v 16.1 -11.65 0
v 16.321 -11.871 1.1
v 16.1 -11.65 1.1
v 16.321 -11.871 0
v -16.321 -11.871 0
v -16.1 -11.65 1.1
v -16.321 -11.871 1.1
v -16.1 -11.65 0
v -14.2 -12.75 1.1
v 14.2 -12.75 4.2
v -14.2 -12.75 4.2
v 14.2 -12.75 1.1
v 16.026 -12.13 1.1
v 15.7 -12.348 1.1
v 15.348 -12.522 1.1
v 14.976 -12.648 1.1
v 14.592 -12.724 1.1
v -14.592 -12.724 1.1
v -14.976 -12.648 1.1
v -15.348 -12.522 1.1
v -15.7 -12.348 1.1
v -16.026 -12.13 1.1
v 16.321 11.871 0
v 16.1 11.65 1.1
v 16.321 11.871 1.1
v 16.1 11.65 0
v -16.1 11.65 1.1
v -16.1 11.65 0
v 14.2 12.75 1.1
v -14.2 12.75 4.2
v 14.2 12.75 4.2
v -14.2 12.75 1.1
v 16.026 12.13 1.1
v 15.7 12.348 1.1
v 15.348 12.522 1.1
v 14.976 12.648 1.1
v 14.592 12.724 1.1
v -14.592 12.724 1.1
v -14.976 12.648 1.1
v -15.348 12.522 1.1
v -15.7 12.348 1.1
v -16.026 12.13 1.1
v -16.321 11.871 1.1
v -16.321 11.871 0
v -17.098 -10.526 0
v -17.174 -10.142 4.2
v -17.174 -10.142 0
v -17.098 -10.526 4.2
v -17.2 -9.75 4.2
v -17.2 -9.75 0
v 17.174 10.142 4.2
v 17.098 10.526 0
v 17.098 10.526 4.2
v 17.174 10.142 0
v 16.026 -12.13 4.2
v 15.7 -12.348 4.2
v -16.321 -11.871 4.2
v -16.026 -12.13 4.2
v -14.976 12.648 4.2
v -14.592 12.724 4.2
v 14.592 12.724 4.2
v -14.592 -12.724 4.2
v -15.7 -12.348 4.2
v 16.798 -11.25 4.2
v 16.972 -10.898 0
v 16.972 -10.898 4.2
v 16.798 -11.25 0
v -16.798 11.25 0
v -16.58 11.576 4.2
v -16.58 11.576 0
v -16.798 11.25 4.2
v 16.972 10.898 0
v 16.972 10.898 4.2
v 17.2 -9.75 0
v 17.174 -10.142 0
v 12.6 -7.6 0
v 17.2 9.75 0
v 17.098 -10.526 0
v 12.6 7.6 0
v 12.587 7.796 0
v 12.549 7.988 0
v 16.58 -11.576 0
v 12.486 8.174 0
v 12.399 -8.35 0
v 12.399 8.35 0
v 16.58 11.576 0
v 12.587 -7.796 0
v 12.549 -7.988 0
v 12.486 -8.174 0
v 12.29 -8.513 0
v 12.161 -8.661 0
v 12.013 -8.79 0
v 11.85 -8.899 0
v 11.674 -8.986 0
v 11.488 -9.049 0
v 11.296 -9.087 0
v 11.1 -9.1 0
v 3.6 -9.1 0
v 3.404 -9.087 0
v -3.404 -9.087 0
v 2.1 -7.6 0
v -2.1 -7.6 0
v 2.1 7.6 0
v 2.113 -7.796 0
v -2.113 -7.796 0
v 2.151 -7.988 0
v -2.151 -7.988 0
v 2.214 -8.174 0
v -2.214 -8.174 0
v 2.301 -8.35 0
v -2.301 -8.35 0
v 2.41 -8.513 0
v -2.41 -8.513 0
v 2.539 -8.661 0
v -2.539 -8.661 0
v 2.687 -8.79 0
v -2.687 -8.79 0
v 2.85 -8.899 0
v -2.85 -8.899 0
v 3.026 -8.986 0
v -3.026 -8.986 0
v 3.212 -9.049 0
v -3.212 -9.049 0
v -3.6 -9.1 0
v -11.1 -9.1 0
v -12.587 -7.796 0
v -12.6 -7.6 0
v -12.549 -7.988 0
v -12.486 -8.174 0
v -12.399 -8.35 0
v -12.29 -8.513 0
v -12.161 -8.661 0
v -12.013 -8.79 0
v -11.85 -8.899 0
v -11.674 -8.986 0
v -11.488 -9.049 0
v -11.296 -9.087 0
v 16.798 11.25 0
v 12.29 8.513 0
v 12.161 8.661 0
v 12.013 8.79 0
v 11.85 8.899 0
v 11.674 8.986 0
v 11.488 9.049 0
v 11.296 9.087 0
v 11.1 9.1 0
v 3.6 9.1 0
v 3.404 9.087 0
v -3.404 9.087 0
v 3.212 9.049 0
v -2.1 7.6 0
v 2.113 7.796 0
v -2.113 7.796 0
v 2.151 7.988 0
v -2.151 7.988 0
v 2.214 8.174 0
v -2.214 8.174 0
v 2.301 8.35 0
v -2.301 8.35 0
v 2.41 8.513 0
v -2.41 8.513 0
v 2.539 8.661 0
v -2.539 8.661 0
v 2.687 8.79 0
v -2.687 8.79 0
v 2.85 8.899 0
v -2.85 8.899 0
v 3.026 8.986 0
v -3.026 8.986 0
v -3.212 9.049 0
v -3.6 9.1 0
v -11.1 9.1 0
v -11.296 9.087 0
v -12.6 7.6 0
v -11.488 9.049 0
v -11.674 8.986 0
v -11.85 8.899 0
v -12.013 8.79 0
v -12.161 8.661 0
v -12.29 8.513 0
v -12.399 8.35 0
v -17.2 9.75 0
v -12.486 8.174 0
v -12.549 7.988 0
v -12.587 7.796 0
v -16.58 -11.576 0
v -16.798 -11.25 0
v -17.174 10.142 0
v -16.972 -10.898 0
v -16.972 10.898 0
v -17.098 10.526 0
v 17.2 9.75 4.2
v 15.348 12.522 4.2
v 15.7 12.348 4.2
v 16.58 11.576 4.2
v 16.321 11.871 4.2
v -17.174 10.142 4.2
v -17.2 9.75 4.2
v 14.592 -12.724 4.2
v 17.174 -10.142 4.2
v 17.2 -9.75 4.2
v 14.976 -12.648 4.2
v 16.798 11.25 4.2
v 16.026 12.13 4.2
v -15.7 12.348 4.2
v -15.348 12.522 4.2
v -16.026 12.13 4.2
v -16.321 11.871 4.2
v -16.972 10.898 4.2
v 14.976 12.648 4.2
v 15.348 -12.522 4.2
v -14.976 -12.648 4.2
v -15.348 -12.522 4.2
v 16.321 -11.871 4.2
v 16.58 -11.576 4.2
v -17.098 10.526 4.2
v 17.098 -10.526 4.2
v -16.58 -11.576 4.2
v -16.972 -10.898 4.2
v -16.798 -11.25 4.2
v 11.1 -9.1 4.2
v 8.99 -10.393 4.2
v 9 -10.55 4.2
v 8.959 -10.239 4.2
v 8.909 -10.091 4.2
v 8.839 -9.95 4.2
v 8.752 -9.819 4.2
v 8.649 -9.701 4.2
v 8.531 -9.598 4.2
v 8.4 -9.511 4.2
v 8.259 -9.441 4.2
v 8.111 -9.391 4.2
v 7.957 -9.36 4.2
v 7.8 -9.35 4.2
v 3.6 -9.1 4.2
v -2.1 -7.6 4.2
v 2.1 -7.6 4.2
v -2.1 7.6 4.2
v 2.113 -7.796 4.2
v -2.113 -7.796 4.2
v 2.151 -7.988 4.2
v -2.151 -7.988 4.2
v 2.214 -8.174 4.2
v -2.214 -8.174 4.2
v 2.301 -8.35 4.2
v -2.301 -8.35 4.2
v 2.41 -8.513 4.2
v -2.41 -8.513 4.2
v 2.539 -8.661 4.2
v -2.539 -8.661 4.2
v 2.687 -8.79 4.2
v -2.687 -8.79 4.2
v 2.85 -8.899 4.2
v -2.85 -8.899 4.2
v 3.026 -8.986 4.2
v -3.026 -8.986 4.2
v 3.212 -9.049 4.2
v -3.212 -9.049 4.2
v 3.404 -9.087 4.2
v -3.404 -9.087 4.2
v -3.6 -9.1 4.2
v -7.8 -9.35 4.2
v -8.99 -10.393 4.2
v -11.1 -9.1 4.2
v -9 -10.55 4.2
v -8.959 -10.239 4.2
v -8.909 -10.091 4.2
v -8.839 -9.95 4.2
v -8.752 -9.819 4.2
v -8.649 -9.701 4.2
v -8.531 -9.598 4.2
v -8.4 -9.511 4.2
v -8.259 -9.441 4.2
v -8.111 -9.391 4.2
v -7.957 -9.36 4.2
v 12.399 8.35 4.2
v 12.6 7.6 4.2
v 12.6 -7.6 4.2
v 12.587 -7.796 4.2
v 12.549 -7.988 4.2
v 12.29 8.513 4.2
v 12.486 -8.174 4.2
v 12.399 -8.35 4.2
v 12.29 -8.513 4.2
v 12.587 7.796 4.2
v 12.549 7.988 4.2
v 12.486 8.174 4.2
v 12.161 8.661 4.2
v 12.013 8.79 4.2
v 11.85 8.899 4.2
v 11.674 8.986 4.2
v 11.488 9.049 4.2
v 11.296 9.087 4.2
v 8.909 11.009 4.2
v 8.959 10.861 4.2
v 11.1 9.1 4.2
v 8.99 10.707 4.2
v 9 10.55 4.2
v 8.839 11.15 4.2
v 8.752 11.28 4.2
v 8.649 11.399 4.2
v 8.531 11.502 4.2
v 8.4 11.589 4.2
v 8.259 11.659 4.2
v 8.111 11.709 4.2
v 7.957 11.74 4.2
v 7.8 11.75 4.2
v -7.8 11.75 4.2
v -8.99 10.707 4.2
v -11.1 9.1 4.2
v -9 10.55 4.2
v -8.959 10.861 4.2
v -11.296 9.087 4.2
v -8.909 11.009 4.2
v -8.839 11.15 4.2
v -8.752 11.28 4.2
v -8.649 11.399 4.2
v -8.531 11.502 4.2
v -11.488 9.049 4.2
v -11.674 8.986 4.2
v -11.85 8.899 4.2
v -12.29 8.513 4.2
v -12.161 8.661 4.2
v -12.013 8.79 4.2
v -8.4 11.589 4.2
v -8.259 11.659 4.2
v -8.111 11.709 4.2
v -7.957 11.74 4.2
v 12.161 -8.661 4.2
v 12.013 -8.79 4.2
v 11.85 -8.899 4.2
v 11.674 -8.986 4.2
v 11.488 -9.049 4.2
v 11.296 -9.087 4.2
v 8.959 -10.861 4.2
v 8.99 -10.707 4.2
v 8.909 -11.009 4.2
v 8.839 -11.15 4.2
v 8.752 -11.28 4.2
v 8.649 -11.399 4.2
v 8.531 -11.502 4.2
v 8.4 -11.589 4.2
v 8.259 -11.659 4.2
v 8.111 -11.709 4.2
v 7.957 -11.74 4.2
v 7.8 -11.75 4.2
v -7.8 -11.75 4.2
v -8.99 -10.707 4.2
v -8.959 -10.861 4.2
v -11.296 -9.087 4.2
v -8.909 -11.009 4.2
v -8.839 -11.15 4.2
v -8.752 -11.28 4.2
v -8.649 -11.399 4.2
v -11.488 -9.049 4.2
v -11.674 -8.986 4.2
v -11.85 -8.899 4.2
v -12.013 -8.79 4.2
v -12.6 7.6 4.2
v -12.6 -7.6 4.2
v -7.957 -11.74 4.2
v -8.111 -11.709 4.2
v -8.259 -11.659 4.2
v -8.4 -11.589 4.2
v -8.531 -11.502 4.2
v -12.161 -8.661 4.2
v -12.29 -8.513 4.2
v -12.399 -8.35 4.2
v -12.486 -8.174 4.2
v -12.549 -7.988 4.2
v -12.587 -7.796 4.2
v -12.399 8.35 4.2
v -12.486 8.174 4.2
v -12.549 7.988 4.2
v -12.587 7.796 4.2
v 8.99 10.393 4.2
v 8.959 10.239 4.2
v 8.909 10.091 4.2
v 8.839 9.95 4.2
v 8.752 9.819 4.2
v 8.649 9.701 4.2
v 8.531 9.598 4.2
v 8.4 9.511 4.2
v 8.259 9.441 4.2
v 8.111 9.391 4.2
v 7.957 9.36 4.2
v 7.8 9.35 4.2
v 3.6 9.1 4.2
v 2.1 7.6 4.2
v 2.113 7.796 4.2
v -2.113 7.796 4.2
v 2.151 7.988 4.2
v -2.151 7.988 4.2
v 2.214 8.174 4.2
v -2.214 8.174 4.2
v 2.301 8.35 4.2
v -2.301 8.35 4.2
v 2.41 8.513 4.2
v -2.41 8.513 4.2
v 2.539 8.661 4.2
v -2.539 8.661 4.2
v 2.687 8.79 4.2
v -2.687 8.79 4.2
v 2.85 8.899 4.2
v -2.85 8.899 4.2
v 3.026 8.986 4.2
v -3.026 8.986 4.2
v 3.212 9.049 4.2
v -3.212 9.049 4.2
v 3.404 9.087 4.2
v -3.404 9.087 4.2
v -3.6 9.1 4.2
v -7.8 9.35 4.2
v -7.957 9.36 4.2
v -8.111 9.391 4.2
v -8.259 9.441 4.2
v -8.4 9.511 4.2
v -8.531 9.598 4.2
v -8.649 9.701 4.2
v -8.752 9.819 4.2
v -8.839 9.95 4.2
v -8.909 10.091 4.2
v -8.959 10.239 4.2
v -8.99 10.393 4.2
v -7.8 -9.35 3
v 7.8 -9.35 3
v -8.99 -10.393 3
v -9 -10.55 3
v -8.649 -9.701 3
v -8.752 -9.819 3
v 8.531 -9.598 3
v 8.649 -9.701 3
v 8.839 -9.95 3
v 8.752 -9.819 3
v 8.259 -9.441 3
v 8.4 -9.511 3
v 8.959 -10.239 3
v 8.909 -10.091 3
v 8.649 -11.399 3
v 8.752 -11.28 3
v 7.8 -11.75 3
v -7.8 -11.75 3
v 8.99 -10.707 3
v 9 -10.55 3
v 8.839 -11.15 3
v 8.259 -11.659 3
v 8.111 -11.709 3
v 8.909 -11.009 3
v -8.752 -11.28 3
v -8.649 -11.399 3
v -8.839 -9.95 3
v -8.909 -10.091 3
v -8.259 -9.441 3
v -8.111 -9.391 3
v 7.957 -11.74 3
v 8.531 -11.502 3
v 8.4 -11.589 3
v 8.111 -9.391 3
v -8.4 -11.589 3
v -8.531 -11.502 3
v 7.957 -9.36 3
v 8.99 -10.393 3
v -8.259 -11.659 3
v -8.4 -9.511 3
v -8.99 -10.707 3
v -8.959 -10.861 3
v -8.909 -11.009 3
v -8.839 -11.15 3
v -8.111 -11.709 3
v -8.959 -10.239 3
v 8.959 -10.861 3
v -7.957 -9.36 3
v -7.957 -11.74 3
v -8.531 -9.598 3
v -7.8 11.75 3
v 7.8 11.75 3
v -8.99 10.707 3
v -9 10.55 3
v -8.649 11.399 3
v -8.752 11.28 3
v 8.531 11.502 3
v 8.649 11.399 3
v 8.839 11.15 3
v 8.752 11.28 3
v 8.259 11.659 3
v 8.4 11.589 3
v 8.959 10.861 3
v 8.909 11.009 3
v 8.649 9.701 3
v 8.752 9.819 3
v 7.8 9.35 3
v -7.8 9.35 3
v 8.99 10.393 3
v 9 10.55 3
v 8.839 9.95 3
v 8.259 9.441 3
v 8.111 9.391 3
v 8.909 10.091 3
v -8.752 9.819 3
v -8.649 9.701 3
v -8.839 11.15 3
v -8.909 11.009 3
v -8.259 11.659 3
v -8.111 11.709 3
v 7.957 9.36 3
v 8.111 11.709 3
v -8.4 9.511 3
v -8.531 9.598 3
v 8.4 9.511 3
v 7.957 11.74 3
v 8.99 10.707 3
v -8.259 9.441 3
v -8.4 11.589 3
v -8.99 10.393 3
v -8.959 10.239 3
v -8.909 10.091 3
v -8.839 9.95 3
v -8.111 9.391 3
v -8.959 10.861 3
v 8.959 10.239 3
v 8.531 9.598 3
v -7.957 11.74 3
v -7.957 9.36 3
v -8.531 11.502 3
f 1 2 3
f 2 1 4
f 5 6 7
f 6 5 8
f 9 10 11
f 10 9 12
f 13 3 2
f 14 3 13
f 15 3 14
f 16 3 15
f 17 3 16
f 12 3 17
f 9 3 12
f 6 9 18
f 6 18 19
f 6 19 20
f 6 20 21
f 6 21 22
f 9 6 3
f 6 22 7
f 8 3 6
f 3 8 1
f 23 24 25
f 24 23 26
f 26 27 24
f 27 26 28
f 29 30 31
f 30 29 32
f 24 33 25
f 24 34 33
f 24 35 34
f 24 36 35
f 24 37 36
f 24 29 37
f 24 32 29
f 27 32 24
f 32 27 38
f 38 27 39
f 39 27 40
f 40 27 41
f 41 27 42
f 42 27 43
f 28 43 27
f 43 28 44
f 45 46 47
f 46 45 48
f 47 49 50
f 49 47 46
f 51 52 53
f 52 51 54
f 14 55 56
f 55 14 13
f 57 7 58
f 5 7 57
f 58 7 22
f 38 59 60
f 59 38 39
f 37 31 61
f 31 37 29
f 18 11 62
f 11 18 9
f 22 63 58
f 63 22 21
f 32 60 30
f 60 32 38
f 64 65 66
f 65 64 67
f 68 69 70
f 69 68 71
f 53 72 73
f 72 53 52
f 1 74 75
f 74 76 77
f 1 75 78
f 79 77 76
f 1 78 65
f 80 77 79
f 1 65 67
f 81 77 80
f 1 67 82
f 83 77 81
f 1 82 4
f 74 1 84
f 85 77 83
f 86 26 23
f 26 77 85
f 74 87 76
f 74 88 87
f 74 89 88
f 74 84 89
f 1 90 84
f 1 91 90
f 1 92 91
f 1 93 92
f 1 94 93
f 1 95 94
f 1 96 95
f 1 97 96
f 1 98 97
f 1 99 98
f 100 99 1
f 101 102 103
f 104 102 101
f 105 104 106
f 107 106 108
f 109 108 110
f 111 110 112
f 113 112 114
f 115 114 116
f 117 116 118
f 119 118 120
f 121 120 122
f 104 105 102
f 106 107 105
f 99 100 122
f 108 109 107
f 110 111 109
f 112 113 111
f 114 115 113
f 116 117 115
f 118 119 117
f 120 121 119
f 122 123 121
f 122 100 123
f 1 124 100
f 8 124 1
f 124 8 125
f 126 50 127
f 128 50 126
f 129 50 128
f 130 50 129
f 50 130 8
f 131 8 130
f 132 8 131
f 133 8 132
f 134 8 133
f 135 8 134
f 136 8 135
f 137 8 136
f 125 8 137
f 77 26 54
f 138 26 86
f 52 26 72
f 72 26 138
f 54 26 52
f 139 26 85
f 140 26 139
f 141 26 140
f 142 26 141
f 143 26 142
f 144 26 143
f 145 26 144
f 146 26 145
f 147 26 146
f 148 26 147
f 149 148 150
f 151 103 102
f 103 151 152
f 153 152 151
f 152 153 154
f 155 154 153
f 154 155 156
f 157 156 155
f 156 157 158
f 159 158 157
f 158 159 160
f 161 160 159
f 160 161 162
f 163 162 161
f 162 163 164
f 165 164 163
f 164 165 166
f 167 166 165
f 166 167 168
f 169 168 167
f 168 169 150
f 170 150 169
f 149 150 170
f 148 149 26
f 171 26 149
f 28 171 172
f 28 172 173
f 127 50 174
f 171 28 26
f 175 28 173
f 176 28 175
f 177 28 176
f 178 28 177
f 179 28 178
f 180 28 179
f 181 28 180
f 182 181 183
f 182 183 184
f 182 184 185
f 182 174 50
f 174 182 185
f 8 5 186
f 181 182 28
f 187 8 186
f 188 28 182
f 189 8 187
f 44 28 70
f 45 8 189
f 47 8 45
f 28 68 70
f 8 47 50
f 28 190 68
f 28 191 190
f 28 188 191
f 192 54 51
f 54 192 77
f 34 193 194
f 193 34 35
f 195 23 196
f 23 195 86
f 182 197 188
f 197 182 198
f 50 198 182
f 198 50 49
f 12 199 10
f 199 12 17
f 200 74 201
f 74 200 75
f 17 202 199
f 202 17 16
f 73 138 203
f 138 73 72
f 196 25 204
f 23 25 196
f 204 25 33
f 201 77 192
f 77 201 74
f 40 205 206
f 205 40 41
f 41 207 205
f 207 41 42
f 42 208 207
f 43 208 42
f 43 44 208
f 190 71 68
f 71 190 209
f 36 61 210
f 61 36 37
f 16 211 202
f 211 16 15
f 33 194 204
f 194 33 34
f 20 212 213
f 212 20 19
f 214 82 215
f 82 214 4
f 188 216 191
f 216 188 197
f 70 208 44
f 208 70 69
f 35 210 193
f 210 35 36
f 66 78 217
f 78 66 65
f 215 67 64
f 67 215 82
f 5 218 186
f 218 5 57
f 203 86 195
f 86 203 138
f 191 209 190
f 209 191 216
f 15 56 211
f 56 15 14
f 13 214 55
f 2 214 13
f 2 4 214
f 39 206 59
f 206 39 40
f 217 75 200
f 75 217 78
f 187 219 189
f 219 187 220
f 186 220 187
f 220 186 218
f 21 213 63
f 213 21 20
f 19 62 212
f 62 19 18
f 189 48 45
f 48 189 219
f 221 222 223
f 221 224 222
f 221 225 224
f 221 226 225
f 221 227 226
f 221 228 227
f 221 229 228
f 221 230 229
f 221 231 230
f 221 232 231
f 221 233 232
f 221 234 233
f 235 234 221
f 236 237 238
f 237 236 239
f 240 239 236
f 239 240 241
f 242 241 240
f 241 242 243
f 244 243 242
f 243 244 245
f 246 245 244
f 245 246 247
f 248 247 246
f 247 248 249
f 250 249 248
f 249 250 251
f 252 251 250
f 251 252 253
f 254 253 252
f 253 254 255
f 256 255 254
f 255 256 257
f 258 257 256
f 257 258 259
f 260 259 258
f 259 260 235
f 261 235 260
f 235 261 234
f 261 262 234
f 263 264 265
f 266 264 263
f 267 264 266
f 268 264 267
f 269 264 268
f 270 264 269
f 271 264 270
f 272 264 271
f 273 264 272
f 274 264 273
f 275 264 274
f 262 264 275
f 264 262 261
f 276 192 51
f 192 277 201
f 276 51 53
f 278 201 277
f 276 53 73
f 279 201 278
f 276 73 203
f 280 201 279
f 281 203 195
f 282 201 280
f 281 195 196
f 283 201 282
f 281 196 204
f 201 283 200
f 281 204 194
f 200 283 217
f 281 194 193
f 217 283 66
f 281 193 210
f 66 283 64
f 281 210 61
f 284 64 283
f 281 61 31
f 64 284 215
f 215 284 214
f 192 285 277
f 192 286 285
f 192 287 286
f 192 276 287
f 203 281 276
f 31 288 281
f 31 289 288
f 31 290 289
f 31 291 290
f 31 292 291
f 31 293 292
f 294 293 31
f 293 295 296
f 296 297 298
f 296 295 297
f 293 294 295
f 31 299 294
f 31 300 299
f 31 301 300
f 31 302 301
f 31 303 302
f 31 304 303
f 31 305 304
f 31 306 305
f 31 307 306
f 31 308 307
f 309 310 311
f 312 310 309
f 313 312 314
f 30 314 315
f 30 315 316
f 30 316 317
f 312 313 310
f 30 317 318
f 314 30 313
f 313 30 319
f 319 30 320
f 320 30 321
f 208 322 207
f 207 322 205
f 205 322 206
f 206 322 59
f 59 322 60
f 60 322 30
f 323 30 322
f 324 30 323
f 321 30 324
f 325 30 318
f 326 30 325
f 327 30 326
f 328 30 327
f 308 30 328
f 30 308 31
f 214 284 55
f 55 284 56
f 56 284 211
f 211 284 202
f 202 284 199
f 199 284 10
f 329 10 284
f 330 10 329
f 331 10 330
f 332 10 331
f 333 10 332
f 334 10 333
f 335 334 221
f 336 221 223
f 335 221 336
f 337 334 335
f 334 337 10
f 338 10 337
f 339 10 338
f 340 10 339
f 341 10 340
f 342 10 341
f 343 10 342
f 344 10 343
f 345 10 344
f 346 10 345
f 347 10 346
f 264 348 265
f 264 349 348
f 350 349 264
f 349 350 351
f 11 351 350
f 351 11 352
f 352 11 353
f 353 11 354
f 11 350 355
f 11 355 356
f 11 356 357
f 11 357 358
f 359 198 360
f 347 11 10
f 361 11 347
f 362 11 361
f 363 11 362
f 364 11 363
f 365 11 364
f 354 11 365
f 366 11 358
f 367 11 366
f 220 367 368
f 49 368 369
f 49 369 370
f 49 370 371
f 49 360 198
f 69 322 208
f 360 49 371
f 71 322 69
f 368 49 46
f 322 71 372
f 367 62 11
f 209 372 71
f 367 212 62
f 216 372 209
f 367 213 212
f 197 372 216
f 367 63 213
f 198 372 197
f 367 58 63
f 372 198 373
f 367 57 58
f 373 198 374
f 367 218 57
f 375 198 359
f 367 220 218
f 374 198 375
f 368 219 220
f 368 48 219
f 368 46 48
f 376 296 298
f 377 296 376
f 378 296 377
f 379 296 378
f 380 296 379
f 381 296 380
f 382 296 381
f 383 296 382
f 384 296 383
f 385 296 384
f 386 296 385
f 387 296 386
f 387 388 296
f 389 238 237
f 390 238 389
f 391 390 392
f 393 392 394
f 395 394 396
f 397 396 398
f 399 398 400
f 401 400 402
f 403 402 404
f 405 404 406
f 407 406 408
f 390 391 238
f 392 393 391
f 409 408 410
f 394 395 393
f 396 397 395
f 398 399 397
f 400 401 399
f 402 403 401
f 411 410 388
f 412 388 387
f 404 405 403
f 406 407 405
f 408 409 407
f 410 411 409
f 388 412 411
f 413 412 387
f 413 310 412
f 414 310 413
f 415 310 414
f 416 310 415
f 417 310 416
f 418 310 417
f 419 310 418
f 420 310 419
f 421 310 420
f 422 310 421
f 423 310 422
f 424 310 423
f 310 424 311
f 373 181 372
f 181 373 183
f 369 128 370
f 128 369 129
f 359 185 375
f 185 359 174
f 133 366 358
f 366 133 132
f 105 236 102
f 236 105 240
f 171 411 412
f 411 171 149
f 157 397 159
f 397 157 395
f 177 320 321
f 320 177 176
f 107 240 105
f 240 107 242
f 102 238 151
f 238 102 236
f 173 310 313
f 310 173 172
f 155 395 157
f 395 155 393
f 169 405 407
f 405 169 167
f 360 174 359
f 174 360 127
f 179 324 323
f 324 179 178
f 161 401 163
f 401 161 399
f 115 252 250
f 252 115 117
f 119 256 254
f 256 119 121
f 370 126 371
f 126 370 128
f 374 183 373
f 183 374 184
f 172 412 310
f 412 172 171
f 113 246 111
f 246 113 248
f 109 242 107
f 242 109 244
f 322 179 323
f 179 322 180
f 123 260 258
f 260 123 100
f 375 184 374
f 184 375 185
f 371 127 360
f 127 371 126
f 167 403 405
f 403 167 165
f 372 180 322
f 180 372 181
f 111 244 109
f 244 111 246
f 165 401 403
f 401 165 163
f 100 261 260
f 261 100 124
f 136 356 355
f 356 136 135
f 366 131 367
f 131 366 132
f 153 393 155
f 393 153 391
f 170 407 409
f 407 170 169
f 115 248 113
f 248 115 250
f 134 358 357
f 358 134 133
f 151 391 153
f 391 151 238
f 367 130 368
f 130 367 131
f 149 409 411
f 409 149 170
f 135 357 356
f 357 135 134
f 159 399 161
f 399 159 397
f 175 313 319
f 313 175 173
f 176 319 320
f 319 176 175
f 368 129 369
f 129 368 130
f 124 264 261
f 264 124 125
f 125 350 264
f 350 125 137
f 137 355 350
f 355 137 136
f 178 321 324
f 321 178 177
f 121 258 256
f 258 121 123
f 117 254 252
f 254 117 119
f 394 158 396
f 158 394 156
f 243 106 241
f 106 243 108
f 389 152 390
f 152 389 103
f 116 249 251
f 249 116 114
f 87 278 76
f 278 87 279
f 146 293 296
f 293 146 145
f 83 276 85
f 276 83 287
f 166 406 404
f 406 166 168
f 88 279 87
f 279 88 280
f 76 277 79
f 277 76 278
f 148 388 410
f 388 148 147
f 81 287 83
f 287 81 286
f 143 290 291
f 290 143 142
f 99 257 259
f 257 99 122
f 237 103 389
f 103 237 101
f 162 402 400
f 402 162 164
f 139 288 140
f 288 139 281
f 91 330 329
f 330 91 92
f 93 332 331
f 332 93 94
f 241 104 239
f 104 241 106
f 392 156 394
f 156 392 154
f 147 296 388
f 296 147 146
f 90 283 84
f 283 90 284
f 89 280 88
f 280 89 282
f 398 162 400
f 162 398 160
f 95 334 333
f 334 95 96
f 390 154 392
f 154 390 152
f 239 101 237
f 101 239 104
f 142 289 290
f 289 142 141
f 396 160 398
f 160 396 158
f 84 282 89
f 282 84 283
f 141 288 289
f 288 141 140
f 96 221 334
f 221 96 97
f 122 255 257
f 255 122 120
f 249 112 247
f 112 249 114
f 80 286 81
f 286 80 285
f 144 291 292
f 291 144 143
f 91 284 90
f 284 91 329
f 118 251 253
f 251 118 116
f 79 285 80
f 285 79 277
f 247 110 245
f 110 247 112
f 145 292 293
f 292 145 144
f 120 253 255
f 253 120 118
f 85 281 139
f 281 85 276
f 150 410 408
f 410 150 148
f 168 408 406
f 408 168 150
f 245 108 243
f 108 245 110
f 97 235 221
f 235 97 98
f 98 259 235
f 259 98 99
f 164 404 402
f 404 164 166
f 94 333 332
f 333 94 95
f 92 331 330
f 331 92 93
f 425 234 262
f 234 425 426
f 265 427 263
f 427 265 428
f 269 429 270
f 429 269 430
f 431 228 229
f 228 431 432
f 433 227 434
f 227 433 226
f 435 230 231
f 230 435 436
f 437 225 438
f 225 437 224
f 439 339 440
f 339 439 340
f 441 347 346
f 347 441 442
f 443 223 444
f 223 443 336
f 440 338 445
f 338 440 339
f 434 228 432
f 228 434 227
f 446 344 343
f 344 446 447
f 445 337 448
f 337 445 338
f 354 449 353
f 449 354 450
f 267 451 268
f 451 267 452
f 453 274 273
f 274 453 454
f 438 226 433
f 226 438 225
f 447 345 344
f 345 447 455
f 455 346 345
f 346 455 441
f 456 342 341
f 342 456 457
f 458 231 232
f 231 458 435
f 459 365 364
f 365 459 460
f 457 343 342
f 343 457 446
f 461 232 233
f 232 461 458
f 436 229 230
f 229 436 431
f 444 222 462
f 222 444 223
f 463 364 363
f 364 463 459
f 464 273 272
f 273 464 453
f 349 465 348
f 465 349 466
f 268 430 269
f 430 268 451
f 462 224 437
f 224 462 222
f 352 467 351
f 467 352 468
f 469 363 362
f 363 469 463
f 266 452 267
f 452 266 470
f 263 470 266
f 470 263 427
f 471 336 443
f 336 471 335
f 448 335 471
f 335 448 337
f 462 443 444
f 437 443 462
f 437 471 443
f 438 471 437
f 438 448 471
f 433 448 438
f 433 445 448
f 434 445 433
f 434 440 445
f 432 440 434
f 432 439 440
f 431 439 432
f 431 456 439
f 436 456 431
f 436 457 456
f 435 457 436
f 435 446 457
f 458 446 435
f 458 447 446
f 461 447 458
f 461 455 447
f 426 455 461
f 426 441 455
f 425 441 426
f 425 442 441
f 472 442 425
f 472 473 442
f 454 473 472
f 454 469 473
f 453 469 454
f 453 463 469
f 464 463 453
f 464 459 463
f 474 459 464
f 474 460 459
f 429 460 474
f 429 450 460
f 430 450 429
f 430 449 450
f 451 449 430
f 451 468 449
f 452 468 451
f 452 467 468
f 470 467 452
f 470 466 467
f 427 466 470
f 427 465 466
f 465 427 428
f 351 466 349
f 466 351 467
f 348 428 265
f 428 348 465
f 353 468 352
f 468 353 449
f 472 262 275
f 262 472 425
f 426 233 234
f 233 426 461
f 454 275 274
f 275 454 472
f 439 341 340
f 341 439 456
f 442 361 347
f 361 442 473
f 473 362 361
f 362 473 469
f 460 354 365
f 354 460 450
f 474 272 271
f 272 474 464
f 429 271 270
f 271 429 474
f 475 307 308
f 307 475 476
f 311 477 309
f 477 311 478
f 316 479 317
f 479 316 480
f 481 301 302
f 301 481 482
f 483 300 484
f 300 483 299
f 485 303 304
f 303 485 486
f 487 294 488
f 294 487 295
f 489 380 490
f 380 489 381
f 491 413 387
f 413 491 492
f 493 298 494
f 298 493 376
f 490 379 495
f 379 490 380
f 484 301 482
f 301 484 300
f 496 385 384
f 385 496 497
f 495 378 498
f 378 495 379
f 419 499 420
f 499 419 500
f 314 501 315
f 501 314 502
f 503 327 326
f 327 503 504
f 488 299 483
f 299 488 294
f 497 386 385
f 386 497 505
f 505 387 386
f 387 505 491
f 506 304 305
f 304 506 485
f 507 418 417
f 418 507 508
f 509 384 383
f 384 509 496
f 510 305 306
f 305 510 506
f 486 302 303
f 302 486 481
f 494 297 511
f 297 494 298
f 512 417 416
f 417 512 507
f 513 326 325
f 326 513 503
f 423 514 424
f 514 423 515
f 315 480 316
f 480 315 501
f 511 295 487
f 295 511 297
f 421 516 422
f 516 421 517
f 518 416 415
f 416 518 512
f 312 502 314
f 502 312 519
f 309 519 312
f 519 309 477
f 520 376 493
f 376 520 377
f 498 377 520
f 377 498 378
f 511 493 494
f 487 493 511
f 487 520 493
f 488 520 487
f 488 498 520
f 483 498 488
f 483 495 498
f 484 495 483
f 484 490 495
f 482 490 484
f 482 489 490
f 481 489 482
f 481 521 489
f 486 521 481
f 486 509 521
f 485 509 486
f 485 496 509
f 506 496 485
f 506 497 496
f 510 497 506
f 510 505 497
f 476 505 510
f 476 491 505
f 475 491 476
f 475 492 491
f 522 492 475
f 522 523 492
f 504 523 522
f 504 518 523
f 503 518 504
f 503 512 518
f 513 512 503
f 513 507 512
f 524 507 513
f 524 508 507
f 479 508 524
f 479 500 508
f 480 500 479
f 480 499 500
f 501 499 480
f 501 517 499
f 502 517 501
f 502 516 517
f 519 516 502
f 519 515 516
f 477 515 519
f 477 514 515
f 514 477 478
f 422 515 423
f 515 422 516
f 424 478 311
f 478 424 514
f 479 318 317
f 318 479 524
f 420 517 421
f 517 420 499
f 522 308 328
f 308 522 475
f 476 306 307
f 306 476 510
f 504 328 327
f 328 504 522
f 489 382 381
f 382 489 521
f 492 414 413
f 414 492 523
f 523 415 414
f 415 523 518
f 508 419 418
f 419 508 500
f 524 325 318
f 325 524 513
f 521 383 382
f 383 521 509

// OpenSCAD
// Replacement sliding clip/buckle for an existing swimming-goggle rubber strap.
// Print in PETG/ABS/ASA for springiness and water resistance.

$fn = 48;

STRAP_WIDTH = 17.5;
STRAP_THICKNESS = 2.4;
CLEARANCE = 0.7;

SLOT_LENGTH = 10.5;
SLOT_WIDTH = STRAP_WIDTH + CLEARANCE;
SLOT_RADIUS = 1.5;

CENTER_BAR_WIDTH = 4.2;
END_RAIL_WIDTH = 4.6;
SLOT_SPACING = SLOT_LENGTH + CENTER_BAR_WIDTH;

CLIP_LENGTH = 2 * SLOT_LENGTH + CENTER_BAR_WIDTH + 2 * END_RAIL_WIDTH;
CLIP_WIDTH = STRAP_WIDTH + 8;
CLIP_THICKNESS = 4.2;
CORNER_RADIUS = 3;

SIDE_RELIEF_DEPTH = 1.2;
SIDE_RELIEF_LENGTH = 18;

module rounded_rect(size, radius) {
    x = size[0];
    y = size[1];

    hull() {
        for (px = [-x / 2 + radius, x / 2 - radius])
            for (py = [-y / 2 + radius, y / 2 - radius])
                translate([px, py])
                    circle(r = radius);
    }
}

module rounded_box(size, radius) {
    linear_extrude(size[2])
        rounded_rect([size[0], size[1]], radius);
}

module strap_slot(xpos) {
    translate([xpos, 0, -0.1])
        linear_extrude(CLIP_THICKNESS + 0.2)
            rounded_rect([SLOT_LENGTH, SLOT_WIDTH], SLOT_RADIUS);
}

module side_relief(ypos) {
    translate([0, ypos, CLIP_THICKNESS - SIDE_RELIEF_DEPTH])
        linear_extrude(SIDE_RELIEF_DEPTH + 0.1)
            rounded_rect([SIDE_RELIEF_LENGTH, 2.4], 1.2);
}

module underside_bevel() {
    bevel = 1.1;

    for (y = [-CLIP_WIDTH / 2, CLIP_WIDTH / 2])
        translate([0, y, -0.1])
            rotate([0, 0, 0])
                linear_extrude(bevel + 0.1)
                    polygon([
                        [-CLIP_LENGTH / 2, 0],
                        [CLIP_LENGTH / 2, 0],
                        [CLIP_LENGTH / 2 - bevel, -sign(y) * bevel],
                        [-CLIP_LENGTH / 2 + bevel, -sign(y) * bevel]
                    ]);
}

module clip() {
    difference() {
        rounded_box([CLIP_LENGTH, CLIP_WIDTH, CLIP_THICKNESS], CORNER_RADIUS);

        strap_slot(-SLOT_SPACING / 2);
        strap_slot(SLOT_SPACING / 2);

        side_relief(-CLIP_WIDTH / 2 + 2.2);
        side_relief(CLIP_WIDTH / 2 - 2.2);

        underside_bevel();
    }
}

clip();
